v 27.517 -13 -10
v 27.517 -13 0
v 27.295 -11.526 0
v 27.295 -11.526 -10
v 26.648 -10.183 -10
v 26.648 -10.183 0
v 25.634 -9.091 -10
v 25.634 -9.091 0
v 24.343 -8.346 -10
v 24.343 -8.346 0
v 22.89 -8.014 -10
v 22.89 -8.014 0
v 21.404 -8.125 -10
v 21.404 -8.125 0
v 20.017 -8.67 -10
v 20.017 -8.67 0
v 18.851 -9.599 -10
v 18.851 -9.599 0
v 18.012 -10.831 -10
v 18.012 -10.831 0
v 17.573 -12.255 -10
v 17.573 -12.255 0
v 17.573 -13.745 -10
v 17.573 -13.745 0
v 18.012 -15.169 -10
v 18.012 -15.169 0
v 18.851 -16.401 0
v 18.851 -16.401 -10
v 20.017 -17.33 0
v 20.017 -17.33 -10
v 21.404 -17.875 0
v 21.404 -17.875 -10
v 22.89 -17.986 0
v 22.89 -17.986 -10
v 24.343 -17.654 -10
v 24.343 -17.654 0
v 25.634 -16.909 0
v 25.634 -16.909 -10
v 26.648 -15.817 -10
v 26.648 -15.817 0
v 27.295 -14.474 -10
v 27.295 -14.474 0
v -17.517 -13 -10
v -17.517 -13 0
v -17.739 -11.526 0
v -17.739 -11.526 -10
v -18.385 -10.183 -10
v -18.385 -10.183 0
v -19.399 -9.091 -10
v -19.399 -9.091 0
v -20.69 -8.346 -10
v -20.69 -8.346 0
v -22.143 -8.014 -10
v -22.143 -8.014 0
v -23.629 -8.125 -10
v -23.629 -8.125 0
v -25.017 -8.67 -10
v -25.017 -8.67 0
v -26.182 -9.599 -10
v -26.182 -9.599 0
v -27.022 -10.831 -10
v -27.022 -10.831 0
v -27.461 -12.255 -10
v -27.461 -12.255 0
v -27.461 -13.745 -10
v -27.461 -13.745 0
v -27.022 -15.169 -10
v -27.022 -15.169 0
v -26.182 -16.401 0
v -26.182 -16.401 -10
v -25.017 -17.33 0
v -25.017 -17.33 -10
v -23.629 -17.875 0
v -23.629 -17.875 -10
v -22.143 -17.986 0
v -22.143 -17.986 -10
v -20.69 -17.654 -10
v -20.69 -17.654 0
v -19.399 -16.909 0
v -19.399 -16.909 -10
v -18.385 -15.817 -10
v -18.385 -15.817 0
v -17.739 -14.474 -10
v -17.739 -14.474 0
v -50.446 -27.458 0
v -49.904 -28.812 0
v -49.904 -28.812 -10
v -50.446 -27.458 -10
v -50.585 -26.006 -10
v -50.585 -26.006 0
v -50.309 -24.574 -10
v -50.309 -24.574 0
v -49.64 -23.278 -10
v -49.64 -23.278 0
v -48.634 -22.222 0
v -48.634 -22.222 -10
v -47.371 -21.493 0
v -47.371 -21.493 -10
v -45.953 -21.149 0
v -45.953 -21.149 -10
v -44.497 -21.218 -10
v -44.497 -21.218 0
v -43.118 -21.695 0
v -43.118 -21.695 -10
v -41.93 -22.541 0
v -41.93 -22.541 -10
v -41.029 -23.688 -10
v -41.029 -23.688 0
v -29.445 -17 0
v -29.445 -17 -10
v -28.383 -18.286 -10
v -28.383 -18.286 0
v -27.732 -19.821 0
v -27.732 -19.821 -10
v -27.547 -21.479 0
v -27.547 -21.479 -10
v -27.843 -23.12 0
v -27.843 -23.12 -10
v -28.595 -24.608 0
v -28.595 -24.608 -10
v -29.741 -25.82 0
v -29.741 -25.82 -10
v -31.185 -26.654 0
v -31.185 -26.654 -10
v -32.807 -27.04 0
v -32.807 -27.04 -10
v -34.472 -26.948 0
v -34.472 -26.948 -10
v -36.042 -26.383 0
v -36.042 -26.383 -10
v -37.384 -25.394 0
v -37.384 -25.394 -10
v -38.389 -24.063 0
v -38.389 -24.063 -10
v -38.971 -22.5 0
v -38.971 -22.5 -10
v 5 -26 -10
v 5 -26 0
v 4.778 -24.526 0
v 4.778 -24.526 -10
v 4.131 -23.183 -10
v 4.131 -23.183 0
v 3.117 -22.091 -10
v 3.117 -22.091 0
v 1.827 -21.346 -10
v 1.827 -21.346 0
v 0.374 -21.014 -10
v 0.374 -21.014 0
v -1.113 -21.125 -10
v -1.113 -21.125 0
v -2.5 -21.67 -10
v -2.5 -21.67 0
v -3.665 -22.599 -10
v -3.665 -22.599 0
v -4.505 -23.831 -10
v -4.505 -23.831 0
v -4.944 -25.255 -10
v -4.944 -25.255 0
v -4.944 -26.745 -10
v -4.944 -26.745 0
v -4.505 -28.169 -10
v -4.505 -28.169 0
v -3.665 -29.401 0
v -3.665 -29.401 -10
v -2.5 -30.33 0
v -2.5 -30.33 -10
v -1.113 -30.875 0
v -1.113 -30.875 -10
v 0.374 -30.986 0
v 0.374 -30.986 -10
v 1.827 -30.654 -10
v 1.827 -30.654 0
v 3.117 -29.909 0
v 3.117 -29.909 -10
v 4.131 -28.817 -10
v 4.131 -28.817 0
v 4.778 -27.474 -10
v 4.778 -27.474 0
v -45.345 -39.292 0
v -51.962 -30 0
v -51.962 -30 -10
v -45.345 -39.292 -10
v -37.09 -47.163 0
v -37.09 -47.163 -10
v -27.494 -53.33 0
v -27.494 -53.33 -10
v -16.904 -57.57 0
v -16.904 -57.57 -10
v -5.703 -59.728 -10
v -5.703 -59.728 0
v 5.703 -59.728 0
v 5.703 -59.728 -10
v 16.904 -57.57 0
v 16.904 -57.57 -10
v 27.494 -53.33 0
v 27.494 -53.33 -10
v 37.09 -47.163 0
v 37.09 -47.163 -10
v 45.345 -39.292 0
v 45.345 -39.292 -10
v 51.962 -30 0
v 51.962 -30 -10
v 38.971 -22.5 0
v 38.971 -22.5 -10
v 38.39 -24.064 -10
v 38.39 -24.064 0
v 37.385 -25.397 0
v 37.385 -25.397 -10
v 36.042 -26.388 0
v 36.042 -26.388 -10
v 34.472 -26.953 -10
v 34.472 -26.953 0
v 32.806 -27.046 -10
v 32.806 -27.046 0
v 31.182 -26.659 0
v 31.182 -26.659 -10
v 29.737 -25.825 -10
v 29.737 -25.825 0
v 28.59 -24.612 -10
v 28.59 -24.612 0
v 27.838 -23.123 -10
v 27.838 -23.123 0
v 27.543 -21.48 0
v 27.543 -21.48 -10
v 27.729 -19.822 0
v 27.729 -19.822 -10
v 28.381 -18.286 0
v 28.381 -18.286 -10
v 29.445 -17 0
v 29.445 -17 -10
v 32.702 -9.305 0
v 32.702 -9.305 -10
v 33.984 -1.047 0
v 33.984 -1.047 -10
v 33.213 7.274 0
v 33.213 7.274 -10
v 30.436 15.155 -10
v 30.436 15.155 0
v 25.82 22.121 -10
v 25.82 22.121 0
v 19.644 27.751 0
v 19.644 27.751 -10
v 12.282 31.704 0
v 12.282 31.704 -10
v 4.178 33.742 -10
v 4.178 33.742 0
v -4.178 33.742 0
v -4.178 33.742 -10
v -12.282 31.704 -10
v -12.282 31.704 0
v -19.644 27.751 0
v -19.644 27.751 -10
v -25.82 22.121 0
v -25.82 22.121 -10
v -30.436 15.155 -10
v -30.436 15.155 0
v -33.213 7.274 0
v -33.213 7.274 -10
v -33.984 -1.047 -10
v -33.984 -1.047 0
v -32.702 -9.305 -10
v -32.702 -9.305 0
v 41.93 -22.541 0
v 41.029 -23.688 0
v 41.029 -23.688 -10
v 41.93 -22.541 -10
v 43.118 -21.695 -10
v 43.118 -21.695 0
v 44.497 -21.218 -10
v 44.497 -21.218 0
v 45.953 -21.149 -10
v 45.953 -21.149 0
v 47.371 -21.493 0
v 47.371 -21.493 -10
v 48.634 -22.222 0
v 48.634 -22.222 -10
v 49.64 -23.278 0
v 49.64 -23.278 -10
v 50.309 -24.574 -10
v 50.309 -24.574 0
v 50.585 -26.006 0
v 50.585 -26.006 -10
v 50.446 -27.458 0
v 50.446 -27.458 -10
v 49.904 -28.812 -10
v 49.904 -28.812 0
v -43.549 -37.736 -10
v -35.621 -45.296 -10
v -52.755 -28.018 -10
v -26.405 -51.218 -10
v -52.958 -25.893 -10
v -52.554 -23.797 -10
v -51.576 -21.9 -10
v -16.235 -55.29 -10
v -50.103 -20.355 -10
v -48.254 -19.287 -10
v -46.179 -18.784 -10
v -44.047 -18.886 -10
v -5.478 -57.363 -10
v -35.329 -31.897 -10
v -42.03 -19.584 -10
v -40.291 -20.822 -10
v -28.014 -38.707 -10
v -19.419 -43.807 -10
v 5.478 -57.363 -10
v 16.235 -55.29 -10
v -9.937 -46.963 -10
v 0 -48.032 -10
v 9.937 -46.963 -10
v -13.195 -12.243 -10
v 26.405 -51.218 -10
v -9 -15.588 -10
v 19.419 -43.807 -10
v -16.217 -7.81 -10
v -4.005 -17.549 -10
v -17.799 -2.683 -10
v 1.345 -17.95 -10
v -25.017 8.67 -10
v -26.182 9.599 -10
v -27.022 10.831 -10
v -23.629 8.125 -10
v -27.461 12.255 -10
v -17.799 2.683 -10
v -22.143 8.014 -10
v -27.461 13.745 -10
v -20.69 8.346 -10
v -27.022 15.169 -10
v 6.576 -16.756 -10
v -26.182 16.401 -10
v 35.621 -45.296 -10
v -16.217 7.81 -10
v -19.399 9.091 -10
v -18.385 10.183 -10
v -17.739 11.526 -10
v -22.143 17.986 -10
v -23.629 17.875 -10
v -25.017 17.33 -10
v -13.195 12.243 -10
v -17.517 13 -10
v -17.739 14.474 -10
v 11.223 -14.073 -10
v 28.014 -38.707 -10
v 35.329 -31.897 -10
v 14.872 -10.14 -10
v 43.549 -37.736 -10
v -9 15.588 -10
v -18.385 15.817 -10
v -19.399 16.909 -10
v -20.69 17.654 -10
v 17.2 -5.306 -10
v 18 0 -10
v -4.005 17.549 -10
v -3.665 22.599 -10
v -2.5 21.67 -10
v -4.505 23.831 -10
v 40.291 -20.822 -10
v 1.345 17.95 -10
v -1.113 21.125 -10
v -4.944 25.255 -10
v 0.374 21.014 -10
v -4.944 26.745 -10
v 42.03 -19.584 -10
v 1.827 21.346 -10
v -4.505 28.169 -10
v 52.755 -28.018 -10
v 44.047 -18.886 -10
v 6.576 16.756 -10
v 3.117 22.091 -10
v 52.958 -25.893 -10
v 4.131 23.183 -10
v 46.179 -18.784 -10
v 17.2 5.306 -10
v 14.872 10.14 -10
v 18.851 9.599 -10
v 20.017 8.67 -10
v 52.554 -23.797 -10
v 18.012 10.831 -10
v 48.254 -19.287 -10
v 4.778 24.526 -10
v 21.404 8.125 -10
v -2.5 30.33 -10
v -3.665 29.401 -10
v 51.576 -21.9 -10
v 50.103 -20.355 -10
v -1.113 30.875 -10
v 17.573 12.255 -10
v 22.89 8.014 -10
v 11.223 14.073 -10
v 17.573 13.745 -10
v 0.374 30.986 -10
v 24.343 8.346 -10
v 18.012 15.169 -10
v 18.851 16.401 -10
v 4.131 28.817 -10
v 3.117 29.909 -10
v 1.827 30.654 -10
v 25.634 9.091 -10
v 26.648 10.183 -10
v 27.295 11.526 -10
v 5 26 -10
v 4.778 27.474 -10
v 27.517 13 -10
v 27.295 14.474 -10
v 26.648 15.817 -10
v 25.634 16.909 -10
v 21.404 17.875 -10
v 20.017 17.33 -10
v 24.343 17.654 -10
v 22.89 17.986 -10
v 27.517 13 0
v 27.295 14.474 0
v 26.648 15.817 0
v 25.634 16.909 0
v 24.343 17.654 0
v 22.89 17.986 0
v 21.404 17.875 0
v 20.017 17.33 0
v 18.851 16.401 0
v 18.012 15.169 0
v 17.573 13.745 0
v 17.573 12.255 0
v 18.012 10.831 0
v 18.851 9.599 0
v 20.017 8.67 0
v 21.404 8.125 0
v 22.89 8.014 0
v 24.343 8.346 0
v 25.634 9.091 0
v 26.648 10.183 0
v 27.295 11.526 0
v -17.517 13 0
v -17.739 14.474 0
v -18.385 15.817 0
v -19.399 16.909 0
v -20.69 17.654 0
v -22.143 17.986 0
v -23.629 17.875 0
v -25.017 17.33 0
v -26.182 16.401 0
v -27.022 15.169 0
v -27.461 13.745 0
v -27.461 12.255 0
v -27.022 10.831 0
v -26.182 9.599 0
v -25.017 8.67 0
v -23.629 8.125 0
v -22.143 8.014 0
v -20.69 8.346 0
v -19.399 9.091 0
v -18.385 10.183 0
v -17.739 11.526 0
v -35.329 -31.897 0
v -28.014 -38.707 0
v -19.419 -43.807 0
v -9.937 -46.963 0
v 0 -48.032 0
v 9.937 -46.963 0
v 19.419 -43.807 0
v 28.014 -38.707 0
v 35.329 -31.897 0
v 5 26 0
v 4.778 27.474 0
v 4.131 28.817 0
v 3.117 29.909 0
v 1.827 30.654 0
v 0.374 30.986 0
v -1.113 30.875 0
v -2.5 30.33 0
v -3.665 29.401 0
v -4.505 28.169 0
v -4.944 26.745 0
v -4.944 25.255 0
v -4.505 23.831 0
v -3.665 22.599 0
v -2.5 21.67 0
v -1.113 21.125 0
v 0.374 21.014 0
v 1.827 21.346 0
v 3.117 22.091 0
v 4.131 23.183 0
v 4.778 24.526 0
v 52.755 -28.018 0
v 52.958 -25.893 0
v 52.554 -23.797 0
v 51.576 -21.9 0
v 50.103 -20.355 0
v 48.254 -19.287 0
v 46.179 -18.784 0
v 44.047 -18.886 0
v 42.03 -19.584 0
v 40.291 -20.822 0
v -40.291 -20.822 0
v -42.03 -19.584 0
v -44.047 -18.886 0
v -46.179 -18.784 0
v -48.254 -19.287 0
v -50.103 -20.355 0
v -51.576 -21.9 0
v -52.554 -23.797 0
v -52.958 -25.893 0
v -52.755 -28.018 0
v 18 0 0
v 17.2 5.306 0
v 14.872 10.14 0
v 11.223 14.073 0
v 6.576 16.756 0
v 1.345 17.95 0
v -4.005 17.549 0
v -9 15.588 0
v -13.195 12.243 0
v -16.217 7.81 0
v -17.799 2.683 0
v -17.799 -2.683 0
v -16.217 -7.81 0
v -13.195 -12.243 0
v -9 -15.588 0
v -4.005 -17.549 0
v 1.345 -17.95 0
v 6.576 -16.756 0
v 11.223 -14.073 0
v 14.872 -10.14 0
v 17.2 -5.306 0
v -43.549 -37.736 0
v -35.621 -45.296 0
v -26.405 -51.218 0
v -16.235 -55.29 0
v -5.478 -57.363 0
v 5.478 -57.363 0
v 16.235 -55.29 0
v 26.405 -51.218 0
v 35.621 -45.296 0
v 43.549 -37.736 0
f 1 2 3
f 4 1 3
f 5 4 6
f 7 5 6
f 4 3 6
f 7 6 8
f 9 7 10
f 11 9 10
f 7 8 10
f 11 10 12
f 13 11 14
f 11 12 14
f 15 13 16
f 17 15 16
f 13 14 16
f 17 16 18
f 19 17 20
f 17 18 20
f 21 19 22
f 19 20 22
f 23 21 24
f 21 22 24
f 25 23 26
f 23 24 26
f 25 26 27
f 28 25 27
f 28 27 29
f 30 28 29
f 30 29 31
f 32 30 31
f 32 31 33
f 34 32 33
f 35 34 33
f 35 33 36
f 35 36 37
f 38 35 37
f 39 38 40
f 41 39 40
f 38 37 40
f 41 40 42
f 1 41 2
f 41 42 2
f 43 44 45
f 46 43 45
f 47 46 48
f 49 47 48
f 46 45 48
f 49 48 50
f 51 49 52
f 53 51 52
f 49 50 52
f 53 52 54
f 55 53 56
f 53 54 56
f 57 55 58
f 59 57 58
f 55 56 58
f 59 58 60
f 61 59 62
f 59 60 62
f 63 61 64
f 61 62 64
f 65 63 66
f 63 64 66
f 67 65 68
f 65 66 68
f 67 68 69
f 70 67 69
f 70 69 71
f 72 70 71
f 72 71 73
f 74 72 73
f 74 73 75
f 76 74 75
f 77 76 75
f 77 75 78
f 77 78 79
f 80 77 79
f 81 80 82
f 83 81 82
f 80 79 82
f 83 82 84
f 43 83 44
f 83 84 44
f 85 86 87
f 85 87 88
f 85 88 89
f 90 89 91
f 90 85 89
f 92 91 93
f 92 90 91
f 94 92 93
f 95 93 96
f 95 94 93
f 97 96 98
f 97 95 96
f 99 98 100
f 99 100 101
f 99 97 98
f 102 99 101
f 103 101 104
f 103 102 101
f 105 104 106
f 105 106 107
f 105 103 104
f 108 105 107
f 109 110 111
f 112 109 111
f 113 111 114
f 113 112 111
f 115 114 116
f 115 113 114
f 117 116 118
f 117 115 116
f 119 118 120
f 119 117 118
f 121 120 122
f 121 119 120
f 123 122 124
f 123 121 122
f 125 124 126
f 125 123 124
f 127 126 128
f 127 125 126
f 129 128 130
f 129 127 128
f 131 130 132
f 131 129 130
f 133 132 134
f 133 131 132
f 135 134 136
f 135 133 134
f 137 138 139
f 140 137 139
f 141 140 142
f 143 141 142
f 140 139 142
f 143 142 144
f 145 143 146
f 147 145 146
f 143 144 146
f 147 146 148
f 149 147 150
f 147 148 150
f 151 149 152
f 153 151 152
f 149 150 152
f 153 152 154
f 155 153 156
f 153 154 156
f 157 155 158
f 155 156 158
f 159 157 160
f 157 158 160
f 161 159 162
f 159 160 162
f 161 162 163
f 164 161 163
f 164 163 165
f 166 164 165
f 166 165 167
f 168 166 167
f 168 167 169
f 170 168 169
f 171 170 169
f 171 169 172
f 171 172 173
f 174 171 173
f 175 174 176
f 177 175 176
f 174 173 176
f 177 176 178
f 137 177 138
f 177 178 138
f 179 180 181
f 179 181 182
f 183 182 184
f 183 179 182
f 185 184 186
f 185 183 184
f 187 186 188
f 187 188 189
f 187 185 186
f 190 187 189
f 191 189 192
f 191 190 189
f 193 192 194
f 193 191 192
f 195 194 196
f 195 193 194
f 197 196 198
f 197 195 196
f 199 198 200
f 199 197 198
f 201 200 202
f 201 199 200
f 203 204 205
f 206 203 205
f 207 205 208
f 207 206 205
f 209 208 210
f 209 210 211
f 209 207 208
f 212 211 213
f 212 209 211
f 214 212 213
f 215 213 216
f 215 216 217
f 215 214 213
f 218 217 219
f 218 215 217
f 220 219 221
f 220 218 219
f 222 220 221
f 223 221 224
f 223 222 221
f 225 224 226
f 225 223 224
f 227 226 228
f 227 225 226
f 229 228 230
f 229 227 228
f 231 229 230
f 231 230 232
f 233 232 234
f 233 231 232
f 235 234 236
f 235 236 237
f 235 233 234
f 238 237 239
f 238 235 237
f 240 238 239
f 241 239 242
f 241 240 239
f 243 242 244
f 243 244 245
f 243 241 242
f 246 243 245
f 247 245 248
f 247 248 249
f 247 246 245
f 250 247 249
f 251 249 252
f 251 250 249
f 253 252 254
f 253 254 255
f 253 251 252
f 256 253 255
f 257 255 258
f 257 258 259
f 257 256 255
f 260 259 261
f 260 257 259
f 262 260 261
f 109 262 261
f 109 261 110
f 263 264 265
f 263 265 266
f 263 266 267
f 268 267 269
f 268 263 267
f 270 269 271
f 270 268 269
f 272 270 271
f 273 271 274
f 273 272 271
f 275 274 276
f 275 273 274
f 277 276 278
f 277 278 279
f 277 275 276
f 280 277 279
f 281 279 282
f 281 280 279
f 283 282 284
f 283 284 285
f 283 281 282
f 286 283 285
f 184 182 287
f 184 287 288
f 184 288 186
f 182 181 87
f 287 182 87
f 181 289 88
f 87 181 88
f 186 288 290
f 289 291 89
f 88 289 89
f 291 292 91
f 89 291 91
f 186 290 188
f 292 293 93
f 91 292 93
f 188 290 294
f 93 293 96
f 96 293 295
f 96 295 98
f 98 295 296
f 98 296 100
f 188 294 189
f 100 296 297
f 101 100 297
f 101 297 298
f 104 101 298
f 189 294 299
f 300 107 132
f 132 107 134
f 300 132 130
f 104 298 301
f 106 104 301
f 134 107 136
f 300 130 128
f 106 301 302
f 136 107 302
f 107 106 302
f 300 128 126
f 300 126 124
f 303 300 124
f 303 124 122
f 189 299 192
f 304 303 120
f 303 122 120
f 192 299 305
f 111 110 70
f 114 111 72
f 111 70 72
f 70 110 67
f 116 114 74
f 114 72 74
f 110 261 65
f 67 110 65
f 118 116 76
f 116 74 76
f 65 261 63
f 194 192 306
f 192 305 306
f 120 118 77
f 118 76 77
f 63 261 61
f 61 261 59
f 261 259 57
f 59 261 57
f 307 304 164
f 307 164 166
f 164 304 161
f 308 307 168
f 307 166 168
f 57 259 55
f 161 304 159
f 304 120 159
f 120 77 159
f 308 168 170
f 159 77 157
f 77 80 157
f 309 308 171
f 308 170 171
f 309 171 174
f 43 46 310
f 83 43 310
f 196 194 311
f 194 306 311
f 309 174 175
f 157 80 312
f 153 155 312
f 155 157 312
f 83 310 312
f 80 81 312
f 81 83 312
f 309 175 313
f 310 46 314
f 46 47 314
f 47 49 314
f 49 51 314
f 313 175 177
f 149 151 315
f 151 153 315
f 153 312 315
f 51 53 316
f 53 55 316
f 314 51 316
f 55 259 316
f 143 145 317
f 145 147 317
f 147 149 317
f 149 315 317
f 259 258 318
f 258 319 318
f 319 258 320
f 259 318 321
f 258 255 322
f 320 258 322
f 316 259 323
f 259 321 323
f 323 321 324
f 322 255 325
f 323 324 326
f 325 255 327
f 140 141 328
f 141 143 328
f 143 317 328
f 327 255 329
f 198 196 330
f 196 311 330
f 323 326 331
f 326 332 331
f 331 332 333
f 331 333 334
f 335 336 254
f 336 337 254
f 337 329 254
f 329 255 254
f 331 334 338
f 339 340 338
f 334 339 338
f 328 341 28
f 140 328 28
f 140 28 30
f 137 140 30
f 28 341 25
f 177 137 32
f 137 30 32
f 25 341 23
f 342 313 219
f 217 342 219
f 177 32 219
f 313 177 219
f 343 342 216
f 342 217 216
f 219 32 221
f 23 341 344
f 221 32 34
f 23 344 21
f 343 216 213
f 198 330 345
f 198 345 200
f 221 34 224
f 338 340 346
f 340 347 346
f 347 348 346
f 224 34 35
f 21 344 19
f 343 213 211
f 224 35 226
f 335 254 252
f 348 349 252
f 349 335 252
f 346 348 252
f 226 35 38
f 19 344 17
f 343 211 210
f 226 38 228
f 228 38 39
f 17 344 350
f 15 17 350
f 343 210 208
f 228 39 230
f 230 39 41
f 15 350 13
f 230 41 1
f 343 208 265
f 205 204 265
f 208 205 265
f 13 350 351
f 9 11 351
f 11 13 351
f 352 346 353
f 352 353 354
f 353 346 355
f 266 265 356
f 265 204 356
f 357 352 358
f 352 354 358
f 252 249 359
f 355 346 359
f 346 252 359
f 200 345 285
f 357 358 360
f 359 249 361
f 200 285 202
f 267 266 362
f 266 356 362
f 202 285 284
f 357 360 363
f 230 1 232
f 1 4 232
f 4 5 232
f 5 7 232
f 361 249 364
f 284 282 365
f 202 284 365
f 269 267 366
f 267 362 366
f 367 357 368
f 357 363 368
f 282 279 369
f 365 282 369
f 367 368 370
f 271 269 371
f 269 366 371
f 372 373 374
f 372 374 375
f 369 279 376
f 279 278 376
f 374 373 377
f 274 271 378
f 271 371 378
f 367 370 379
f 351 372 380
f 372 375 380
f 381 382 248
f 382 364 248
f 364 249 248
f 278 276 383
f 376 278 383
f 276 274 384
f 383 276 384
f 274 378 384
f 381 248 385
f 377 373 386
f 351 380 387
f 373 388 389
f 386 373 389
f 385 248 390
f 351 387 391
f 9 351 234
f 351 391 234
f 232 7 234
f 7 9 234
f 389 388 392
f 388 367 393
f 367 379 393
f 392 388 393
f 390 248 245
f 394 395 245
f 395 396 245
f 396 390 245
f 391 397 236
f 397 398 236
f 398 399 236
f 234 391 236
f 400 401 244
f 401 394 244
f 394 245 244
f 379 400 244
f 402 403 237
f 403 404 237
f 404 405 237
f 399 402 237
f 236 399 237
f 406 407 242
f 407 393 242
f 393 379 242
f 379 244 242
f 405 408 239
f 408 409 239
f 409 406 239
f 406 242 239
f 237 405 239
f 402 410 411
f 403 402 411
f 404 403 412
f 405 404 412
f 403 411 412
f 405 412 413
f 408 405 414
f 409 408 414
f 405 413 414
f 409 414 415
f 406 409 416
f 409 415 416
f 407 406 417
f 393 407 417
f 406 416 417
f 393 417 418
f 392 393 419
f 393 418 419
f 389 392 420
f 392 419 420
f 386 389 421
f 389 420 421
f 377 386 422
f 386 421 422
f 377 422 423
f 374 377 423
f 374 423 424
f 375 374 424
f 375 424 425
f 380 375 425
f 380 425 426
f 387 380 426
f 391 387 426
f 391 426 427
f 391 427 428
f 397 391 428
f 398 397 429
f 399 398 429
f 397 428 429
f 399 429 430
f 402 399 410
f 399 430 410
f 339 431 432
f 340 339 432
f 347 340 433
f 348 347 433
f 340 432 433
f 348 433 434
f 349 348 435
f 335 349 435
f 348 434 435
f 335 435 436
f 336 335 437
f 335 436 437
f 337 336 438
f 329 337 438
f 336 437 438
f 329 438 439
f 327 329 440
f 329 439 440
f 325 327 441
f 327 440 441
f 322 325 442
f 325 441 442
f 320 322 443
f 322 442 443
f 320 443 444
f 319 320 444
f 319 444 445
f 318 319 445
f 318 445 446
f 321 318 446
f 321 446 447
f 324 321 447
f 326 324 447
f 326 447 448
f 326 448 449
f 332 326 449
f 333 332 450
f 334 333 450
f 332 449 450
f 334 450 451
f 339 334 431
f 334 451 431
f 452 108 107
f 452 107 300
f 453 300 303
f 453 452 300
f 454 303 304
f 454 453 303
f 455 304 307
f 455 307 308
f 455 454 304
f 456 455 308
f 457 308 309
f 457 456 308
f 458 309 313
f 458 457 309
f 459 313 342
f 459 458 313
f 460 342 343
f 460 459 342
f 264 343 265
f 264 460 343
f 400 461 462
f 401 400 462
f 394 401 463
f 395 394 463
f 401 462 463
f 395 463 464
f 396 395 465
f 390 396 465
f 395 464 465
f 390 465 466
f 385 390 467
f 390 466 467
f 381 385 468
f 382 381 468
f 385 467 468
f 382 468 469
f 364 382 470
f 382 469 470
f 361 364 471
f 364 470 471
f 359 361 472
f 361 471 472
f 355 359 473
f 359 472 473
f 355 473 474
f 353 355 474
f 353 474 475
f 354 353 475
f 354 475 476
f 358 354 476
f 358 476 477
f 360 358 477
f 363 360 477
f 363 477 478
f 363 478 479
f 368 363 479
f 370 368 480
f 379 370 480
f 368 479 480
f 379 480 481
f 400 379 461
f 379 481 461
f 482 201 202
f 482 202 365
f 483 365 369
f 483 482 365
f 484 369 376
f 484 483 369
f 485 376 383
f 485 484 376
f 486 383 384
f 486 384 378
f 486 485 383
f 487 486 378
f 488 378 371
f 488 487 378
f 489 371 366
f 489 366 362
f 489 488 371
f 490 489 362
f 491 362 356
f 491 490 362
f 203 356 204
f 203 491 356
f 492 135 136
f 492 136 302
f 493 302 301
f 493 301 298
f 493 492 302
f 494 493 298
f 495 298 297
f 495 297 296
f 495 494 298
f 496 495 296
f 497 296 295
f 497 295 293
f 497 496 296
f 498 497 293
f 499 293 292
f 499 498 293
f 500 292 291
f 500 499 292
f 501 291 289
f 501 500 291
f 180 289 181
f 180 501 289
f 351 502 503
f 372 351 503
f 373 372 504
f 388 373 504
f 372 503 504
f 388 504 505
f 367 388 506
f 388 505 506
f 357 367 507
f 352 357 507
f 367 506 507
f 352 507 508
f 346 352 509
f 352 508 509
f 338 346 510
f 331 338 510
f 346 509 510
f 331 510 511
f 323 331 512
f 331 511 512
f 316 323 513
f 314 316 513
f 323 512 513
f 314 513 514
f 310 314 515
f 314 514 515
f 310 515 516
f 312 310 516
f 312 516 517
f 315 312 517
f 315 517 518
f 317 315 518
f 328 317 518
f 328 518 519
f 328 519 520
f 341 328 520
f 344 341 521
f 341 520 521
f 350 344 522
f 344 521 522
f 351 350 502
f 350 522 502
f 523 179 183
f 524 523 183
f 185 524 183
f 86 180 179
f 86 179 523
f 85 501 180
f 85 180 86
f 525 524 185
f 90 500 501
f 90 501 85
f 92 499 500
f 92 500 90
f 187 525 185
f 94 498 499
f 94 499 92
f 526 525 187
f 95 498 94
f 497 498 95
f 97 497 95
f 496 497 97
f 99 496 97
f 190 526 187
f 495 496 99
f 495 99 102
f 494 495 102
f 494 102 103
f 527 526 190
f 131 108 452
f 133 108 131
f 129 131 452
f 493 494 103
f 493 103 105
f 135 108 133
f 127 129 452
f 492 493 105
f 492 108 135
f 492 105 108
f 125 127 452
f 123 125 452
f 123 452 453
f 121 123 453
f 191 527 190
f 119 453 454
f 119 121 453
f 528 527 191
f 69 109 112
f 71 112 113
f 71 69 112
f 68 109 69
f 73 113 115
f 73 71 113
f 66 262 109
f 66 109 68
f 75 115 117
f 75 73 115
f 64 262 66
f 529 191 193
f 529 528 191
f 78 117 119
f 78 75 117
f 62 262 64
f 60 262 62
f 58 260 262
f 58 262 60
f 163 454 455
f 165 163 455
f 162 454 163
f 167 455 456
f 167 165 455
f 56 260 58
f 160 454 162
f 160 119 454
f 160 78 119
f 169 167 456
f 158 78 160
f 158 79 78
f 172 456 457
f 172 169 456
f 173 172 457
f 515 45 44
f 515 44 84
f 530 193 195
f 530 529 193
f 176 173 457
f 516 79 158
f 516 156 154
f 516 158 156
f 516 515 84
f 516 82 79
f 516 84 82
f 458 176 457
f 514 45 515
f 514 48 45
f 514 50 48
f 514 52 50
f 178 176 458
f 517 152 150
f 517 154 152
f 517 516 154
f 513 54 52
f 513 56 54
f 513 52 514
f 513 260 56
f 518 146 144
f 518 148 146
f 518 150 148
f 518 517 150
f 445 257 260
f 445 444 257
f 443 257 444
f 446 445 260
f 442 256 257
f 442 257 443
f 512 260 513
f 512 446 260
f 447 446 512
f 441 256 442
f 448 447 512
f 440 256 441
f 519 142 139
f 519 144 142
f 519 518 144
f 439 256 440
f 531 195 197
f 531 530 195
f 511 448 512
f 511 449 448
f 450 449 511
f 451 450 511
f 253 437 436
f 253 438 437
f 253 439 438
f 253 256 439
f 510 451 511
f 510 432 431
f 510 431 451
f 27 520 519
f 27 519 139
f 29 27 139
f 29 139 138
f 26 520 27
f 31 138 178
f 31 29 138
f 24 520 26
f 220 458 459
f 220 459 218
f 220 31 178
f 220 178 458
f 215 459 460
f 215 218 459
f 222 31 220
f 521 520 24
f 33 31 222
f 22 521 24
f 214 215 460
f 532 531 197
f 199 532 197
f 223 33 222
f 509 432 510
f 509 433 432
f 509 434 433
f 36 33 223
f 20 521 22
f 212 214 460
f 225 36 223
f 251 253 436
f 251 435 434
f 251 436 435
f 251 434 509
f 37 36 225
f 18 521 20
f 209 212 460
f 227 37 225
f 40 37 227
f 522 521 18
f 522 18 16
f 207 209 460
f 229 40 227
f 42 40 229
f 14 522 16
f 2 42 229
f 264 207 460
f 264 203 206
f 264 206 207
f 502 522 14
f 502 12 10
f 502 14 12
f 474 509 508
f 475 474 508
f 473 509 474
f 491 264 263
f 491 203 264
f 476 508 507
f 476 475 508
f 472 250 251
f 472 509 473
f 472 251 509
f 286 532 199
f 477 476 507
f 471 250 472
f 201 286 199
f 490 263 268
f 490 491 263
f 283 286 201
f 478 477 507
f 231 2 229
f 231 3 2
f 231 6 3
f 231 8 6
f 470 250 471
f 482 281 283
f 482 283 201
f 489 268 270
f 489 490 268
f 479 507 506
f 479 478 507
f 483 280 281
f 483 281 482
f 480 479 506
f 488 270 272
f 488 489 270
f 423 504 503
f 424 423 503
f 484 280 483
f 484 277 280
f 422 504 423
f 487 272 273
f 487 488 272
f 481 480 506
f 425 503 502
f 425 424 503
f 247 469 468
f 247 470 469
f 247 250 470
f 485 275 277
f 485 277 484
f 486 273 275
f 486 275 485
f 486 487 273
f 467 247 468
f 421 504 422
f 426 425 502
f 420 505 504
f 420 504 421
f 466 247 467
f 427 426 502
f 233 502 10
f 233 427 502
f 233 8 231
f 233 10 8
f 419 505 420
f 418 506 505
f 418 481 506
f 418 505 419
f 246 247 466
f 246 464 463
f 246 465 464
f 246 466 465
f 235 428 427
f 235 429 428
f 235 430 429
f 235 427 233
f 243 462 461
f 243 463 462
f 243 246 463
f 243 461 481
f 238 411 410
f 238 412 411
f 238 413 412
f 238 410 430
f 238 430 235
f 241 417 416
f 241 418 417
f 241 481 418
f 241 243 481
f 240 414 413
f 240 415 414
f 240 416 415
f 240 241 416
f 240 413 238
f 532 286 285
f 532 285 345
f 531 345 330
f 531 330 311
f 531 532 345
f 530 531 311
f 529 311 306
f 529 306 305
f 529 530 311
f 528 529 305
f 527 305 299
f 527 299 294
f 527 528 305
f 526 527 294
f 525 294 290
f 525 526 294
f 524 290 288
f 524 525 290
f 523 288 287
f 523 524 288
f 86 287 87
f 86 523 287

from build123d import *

# Parameters (mm, degrees)
SKETCH2_R           = 5
SKETCH2_R_2         = 18
BOSS_EXTRUDE1_DEPTH = 10


with BuildPart() as part:
    # Sketch2 → Boss-Extrude1 (new body)
    with BuildSketch(Plane.XY):
        with BuildLine():
            ThreePointArc((29.444863729, -17), (0, 34), (-29.444863729, -17))
            ThreePointArc((-29.444863729, -17), (-30.432675575, -26.289059694), (-38.97114317, -22.5))
            ThreePointArc((-38.97114317, -22.5), (-49.216333699, -19.754809472), (-51.961524227, -30))
            ThreePointArc((-51.961524227, -30), (0, -60), (51.961524227, -30))
            ThreePointArc((51.961524227, -30), (49.216333699, -19.754809472), (38.97114317, -22.5))
            ThreePointArc((38.97114317, -22.5), (30.429409054, -26.294717474), (29.444863729, -17))
        make_face()
        with Locations((22.516660498, -13)):
            Circle(SKETCH2_R, mode=Mode.SUBTRACT)
        with Locations((0, -26)):
            Circle(SKETCH2_R, mode=Mode.SUBTRACT)
        with Locations((-22.516660498, -13)):
            Circle(SKETCH2_R, mode=Mode.SUBTRACT)
        with Locations((-22.516660498, 13)):
            Circle(SKETCH2_R, mode=Mode.SUBTRACT)
        with Locations((0, 26)):
            Circle(SKETCH2_R, mode=Mode.SUBTRACT)
        with Locations((22.516660498, 13)):
            Circle(SKETCH2_R, mode=Mode.SUBTRACT)
        with BuildLine():
            ThreePointArc((-49.903995186, -28.812085055), (-48.028418753, -21.812338512), (-41.028672211, -23.687914945))
            ThreePointArc((-41.028672211, -23.687914945), (0, -48.031541814), (41.028672211, -23.687914945))
            ThreePointArc((41.028672211, -23.687914945), (48.028418753, -21.812338512), (49.903995186, -28.812085055))
            ThreePointArc((49.903995186, -28.812085055), (0, -57.624170109), (-49.903995186, -28.812085055))
        make_face(mode=Mode.SUBTRACT)
        Circle(SKETCH2_R_2, mode=Mode.SUBTRACT)
    extrude(amount=-BOSS_EXTRUDE1_DEPTH)


solid = part.part
